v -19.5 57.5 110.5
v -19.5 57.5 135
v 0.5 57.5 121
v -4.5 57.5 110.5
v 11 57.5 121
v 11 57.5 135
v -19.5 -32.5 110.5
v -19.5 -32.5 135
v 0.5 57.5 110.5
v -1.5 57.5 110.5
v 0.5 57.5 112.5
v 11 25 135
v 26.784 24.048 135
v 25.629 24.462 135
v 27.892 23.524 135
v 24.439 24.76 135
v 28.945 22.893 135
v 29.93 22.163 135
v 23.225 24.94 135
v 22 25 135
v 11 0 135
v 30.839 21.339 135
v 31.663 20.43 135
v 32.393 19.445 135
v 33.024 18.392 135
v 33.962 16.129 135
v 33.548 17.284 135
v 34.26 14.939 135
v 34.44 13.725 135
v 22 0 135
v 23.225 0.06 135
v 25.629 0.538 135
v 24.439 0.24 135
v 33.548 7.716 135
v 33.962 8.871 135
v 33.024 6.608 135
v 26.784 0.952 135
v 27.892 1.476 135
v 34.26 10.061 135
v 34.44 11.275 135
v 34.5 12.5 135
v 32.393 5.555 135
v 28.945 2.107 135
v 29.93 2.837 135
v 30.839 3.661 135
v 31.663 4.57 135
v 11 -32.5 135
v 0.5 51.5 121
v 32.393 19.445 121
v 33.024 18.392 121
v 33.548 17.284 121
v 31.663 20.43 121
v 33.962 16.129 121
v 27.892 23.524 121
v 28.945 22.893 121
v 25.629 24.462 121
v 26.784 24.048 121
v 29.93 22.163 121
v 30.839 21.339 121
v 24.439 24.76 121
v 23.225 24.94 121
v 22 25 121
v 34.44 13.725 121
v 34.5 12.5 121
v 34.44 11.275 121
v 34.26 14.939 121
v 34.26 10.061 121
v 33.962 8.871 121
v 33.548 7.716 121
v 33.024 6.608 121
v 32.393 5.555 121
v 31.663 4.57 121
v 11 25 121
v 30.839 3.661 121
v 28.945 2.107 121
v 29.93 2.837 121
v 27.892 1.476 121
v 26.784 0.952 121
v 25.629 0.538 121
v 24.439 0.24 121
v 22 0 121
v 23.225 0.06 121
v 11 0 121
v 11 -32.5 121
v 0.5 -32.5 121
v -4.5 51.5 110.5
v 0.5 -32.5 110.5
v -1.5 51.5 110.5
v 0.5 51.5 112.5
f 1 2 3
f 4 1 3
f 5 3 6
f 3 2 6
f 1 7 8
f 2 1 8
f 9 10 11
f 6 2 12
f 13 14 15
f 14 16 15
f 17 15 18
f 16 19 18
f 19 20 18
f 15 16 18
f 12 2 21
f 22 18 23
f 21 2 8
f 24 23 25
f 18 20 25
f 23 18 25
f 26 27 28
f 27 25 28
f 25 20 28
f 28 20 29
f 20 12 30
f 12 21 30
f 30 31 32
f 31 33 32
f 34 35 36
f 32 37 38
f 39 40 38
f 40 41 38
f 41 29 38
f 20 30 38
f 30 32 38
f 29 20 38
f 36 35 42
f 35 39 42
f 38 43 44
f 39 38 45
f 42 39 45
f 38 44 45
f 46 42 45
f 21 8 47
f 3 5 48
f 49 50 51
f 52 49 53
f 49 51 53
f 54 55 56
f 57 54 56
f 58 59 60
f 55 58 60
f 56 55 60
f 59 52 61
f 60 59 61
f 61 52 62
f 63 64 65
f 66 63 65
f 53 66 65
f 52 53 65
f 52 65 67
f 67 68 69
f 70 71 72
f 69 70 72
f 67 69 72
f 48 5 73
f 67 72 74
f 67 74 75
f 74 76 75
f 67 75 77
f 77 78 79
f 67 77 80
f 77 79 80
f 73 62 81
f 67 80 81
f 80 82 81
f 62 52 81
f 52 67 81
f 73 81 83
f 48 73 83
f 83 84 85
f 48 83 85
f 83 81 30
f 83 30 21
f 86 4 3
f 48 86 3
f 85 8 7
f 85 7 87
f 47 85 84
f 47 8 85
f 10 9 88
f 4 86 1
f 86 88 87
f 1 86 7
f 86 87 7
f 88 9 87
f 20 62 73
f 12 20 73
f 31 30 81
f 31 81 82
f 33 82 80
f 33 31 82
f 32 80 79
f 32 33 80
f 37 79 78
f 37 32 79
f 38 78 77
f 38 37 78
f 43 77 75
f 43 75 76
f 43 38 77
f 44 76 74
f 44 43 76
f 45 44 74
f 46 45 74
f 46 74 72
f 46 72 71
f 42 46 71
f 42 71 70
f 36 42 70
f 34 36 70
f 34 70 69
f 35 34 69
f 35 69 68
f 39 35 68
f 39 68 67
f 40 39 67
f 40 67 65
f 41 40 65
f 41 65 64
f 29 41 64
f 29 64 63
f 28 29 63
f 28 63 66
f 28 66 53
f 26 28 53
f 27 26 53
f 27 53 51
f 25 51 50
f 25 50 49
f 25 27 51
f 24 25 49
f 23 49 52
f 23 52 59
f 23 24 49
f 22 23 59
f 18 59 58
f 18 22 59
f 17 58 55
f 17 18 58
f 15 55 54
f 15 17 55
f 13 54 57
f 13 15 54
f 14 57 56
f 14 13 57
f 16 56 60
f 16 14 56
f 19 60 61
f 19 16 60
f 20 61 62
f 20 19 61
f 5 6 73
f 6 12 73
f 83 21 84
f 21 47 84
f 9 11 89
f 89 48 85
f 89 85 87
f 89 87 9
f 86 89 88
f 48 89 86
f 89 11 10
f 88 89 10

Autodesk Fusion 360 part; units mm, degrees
sketch "sketch 237" plane through (0, -32.5, 0) normal (0, -1, 0) x (1, 0, 0)
  line L0 (-84, 110) -> (-109, 105)
  line L1 (-109, 105) -> (-109, 102.5)
  line L2 (-109, 102.5) -> (11, 102.5)
  line L3 (11, 102.5) -> (11, 120)
  line L4 (11, 120) -> (1, 120)
  line L5 (1, 120) -> (1, 110)
  line L6 (1, 110) -> (-84, 110)
  line L7 (0.5, 110.5) -> (-19.5, 110.5)
  line L8 (-19.5, 110.5) -> (-19.5, 135)
  line L9 (-19.5, 135) -> (0.5, 135)
  line L10 (0.5, 135) -> (0.5, 110.5)
  line L11 (0.5, 135) -> (11, 135)
  line L12 (11, 135) -> (11, 121)
  line L13 (11, 121) -> (0.5, 121)
  line L14 (0.5, 121) -> (0.5, 135)
  dimension "d50" = 0.5
  dimension "d51" = 0.5
  dimension "d52" = 15
  dimension "d53" = 20
  dimension "d54" = 1
extrude "Extrude1" add sketch "sketch 237" against normal blind 90 contours L7 L8 L9 L10 L14 | L10 L11 L12 L13 L14
sketch "sketch 690" plane through (0, 0, 135) normal (0, 0, 1) x (-1, 0, 0)
  line L0 (-10, -39) -> (-11, -40)
  line L1 (-11, -40) -> (-11, -47.5)
  line L2 (-11, -47.5) -> (-1, -57.5)
  line L3 (-1, -57.5) -> (9.5, -57.5)
  line L4 (9.5, -57.5) -> (9.5, 32.5)
  line L5 (9.5, 32.5) -> (-1, 32.5)
  line L6 (-1, 32.5) -> (-11, 22.5)
  line L7 (-11, 22.5) -> (-11, 15)
  line L8 (-11, 15) -> (-10, 14)
  line L9 (-10, 14) -> (-8, 14)
  line L10 (-8, 14) -> (-8, 5.5)
  line L11 (-8, 5.5) -> (-10, 5.5)
  line L12 (-10, 5.5) -> (-11, 4.5)
  line L13 (-11, 4.5) -> (-11, -29.5)
  line L14 (-11, -29.5) -> (-10, -30.5)
  line L15 (-10, -30.5) -> (-8, -30.5)
  line L16 (-8, -30.5) -> (-8, -39)
  line L17 (-8, -39) -> (-10, -39)
  line L18 (-11, -12.5) -> (-22, -12.5) construction
  line L19 (-22, -12.5) -> (-22, -25) construction
  line L20 (-22, -25) -> (-11, -25)
  line L21 (-22, 0) -> (-11, 0)
  line L22 (-22, -12.5) -> (-22, 0) construction
  arc A0 (-22, 0) -> (-22, -25) centre (-22, -12.5) ccw
  dimension "d66" = 11
  dimension "d67" = 12.5
extrude "Extrude3" add sketch "sketch 690" against normal up to surface (14 mm away) contours L13 L20 L21 A0
sketch "sketch 1375" plane through (0.5, 57.5, -0.7504) normal (0, 1, 0) x (-1, 0, 0)
  line L0 (2, 111.2504) -> (5, 111.2504)
  line L1 (2, 111.2504) -> (5, 111.2504)
  line L2 (2, 111.2504) -> (5, 111.2504)
  line L3 (5, 111.2504) -> (0, 121.7504)
  line L4 (0, 121.7504) -> (0, 113.2504)
  line L5 (0, 121.7504) -> (0, 113.2504)
  line L6 (0, 121.7504) -> (0, 113.2504)
  line L7 (0, 113.2504) -> (2, 111.2504)
  line L8 (0, 113.2504) -> (2, 111.2504)
  line L9 (0, 113.2504) -> (2, 111.2504)
extrude "Extrude4" cut sketch "sketch 1375" against normal blind 6
